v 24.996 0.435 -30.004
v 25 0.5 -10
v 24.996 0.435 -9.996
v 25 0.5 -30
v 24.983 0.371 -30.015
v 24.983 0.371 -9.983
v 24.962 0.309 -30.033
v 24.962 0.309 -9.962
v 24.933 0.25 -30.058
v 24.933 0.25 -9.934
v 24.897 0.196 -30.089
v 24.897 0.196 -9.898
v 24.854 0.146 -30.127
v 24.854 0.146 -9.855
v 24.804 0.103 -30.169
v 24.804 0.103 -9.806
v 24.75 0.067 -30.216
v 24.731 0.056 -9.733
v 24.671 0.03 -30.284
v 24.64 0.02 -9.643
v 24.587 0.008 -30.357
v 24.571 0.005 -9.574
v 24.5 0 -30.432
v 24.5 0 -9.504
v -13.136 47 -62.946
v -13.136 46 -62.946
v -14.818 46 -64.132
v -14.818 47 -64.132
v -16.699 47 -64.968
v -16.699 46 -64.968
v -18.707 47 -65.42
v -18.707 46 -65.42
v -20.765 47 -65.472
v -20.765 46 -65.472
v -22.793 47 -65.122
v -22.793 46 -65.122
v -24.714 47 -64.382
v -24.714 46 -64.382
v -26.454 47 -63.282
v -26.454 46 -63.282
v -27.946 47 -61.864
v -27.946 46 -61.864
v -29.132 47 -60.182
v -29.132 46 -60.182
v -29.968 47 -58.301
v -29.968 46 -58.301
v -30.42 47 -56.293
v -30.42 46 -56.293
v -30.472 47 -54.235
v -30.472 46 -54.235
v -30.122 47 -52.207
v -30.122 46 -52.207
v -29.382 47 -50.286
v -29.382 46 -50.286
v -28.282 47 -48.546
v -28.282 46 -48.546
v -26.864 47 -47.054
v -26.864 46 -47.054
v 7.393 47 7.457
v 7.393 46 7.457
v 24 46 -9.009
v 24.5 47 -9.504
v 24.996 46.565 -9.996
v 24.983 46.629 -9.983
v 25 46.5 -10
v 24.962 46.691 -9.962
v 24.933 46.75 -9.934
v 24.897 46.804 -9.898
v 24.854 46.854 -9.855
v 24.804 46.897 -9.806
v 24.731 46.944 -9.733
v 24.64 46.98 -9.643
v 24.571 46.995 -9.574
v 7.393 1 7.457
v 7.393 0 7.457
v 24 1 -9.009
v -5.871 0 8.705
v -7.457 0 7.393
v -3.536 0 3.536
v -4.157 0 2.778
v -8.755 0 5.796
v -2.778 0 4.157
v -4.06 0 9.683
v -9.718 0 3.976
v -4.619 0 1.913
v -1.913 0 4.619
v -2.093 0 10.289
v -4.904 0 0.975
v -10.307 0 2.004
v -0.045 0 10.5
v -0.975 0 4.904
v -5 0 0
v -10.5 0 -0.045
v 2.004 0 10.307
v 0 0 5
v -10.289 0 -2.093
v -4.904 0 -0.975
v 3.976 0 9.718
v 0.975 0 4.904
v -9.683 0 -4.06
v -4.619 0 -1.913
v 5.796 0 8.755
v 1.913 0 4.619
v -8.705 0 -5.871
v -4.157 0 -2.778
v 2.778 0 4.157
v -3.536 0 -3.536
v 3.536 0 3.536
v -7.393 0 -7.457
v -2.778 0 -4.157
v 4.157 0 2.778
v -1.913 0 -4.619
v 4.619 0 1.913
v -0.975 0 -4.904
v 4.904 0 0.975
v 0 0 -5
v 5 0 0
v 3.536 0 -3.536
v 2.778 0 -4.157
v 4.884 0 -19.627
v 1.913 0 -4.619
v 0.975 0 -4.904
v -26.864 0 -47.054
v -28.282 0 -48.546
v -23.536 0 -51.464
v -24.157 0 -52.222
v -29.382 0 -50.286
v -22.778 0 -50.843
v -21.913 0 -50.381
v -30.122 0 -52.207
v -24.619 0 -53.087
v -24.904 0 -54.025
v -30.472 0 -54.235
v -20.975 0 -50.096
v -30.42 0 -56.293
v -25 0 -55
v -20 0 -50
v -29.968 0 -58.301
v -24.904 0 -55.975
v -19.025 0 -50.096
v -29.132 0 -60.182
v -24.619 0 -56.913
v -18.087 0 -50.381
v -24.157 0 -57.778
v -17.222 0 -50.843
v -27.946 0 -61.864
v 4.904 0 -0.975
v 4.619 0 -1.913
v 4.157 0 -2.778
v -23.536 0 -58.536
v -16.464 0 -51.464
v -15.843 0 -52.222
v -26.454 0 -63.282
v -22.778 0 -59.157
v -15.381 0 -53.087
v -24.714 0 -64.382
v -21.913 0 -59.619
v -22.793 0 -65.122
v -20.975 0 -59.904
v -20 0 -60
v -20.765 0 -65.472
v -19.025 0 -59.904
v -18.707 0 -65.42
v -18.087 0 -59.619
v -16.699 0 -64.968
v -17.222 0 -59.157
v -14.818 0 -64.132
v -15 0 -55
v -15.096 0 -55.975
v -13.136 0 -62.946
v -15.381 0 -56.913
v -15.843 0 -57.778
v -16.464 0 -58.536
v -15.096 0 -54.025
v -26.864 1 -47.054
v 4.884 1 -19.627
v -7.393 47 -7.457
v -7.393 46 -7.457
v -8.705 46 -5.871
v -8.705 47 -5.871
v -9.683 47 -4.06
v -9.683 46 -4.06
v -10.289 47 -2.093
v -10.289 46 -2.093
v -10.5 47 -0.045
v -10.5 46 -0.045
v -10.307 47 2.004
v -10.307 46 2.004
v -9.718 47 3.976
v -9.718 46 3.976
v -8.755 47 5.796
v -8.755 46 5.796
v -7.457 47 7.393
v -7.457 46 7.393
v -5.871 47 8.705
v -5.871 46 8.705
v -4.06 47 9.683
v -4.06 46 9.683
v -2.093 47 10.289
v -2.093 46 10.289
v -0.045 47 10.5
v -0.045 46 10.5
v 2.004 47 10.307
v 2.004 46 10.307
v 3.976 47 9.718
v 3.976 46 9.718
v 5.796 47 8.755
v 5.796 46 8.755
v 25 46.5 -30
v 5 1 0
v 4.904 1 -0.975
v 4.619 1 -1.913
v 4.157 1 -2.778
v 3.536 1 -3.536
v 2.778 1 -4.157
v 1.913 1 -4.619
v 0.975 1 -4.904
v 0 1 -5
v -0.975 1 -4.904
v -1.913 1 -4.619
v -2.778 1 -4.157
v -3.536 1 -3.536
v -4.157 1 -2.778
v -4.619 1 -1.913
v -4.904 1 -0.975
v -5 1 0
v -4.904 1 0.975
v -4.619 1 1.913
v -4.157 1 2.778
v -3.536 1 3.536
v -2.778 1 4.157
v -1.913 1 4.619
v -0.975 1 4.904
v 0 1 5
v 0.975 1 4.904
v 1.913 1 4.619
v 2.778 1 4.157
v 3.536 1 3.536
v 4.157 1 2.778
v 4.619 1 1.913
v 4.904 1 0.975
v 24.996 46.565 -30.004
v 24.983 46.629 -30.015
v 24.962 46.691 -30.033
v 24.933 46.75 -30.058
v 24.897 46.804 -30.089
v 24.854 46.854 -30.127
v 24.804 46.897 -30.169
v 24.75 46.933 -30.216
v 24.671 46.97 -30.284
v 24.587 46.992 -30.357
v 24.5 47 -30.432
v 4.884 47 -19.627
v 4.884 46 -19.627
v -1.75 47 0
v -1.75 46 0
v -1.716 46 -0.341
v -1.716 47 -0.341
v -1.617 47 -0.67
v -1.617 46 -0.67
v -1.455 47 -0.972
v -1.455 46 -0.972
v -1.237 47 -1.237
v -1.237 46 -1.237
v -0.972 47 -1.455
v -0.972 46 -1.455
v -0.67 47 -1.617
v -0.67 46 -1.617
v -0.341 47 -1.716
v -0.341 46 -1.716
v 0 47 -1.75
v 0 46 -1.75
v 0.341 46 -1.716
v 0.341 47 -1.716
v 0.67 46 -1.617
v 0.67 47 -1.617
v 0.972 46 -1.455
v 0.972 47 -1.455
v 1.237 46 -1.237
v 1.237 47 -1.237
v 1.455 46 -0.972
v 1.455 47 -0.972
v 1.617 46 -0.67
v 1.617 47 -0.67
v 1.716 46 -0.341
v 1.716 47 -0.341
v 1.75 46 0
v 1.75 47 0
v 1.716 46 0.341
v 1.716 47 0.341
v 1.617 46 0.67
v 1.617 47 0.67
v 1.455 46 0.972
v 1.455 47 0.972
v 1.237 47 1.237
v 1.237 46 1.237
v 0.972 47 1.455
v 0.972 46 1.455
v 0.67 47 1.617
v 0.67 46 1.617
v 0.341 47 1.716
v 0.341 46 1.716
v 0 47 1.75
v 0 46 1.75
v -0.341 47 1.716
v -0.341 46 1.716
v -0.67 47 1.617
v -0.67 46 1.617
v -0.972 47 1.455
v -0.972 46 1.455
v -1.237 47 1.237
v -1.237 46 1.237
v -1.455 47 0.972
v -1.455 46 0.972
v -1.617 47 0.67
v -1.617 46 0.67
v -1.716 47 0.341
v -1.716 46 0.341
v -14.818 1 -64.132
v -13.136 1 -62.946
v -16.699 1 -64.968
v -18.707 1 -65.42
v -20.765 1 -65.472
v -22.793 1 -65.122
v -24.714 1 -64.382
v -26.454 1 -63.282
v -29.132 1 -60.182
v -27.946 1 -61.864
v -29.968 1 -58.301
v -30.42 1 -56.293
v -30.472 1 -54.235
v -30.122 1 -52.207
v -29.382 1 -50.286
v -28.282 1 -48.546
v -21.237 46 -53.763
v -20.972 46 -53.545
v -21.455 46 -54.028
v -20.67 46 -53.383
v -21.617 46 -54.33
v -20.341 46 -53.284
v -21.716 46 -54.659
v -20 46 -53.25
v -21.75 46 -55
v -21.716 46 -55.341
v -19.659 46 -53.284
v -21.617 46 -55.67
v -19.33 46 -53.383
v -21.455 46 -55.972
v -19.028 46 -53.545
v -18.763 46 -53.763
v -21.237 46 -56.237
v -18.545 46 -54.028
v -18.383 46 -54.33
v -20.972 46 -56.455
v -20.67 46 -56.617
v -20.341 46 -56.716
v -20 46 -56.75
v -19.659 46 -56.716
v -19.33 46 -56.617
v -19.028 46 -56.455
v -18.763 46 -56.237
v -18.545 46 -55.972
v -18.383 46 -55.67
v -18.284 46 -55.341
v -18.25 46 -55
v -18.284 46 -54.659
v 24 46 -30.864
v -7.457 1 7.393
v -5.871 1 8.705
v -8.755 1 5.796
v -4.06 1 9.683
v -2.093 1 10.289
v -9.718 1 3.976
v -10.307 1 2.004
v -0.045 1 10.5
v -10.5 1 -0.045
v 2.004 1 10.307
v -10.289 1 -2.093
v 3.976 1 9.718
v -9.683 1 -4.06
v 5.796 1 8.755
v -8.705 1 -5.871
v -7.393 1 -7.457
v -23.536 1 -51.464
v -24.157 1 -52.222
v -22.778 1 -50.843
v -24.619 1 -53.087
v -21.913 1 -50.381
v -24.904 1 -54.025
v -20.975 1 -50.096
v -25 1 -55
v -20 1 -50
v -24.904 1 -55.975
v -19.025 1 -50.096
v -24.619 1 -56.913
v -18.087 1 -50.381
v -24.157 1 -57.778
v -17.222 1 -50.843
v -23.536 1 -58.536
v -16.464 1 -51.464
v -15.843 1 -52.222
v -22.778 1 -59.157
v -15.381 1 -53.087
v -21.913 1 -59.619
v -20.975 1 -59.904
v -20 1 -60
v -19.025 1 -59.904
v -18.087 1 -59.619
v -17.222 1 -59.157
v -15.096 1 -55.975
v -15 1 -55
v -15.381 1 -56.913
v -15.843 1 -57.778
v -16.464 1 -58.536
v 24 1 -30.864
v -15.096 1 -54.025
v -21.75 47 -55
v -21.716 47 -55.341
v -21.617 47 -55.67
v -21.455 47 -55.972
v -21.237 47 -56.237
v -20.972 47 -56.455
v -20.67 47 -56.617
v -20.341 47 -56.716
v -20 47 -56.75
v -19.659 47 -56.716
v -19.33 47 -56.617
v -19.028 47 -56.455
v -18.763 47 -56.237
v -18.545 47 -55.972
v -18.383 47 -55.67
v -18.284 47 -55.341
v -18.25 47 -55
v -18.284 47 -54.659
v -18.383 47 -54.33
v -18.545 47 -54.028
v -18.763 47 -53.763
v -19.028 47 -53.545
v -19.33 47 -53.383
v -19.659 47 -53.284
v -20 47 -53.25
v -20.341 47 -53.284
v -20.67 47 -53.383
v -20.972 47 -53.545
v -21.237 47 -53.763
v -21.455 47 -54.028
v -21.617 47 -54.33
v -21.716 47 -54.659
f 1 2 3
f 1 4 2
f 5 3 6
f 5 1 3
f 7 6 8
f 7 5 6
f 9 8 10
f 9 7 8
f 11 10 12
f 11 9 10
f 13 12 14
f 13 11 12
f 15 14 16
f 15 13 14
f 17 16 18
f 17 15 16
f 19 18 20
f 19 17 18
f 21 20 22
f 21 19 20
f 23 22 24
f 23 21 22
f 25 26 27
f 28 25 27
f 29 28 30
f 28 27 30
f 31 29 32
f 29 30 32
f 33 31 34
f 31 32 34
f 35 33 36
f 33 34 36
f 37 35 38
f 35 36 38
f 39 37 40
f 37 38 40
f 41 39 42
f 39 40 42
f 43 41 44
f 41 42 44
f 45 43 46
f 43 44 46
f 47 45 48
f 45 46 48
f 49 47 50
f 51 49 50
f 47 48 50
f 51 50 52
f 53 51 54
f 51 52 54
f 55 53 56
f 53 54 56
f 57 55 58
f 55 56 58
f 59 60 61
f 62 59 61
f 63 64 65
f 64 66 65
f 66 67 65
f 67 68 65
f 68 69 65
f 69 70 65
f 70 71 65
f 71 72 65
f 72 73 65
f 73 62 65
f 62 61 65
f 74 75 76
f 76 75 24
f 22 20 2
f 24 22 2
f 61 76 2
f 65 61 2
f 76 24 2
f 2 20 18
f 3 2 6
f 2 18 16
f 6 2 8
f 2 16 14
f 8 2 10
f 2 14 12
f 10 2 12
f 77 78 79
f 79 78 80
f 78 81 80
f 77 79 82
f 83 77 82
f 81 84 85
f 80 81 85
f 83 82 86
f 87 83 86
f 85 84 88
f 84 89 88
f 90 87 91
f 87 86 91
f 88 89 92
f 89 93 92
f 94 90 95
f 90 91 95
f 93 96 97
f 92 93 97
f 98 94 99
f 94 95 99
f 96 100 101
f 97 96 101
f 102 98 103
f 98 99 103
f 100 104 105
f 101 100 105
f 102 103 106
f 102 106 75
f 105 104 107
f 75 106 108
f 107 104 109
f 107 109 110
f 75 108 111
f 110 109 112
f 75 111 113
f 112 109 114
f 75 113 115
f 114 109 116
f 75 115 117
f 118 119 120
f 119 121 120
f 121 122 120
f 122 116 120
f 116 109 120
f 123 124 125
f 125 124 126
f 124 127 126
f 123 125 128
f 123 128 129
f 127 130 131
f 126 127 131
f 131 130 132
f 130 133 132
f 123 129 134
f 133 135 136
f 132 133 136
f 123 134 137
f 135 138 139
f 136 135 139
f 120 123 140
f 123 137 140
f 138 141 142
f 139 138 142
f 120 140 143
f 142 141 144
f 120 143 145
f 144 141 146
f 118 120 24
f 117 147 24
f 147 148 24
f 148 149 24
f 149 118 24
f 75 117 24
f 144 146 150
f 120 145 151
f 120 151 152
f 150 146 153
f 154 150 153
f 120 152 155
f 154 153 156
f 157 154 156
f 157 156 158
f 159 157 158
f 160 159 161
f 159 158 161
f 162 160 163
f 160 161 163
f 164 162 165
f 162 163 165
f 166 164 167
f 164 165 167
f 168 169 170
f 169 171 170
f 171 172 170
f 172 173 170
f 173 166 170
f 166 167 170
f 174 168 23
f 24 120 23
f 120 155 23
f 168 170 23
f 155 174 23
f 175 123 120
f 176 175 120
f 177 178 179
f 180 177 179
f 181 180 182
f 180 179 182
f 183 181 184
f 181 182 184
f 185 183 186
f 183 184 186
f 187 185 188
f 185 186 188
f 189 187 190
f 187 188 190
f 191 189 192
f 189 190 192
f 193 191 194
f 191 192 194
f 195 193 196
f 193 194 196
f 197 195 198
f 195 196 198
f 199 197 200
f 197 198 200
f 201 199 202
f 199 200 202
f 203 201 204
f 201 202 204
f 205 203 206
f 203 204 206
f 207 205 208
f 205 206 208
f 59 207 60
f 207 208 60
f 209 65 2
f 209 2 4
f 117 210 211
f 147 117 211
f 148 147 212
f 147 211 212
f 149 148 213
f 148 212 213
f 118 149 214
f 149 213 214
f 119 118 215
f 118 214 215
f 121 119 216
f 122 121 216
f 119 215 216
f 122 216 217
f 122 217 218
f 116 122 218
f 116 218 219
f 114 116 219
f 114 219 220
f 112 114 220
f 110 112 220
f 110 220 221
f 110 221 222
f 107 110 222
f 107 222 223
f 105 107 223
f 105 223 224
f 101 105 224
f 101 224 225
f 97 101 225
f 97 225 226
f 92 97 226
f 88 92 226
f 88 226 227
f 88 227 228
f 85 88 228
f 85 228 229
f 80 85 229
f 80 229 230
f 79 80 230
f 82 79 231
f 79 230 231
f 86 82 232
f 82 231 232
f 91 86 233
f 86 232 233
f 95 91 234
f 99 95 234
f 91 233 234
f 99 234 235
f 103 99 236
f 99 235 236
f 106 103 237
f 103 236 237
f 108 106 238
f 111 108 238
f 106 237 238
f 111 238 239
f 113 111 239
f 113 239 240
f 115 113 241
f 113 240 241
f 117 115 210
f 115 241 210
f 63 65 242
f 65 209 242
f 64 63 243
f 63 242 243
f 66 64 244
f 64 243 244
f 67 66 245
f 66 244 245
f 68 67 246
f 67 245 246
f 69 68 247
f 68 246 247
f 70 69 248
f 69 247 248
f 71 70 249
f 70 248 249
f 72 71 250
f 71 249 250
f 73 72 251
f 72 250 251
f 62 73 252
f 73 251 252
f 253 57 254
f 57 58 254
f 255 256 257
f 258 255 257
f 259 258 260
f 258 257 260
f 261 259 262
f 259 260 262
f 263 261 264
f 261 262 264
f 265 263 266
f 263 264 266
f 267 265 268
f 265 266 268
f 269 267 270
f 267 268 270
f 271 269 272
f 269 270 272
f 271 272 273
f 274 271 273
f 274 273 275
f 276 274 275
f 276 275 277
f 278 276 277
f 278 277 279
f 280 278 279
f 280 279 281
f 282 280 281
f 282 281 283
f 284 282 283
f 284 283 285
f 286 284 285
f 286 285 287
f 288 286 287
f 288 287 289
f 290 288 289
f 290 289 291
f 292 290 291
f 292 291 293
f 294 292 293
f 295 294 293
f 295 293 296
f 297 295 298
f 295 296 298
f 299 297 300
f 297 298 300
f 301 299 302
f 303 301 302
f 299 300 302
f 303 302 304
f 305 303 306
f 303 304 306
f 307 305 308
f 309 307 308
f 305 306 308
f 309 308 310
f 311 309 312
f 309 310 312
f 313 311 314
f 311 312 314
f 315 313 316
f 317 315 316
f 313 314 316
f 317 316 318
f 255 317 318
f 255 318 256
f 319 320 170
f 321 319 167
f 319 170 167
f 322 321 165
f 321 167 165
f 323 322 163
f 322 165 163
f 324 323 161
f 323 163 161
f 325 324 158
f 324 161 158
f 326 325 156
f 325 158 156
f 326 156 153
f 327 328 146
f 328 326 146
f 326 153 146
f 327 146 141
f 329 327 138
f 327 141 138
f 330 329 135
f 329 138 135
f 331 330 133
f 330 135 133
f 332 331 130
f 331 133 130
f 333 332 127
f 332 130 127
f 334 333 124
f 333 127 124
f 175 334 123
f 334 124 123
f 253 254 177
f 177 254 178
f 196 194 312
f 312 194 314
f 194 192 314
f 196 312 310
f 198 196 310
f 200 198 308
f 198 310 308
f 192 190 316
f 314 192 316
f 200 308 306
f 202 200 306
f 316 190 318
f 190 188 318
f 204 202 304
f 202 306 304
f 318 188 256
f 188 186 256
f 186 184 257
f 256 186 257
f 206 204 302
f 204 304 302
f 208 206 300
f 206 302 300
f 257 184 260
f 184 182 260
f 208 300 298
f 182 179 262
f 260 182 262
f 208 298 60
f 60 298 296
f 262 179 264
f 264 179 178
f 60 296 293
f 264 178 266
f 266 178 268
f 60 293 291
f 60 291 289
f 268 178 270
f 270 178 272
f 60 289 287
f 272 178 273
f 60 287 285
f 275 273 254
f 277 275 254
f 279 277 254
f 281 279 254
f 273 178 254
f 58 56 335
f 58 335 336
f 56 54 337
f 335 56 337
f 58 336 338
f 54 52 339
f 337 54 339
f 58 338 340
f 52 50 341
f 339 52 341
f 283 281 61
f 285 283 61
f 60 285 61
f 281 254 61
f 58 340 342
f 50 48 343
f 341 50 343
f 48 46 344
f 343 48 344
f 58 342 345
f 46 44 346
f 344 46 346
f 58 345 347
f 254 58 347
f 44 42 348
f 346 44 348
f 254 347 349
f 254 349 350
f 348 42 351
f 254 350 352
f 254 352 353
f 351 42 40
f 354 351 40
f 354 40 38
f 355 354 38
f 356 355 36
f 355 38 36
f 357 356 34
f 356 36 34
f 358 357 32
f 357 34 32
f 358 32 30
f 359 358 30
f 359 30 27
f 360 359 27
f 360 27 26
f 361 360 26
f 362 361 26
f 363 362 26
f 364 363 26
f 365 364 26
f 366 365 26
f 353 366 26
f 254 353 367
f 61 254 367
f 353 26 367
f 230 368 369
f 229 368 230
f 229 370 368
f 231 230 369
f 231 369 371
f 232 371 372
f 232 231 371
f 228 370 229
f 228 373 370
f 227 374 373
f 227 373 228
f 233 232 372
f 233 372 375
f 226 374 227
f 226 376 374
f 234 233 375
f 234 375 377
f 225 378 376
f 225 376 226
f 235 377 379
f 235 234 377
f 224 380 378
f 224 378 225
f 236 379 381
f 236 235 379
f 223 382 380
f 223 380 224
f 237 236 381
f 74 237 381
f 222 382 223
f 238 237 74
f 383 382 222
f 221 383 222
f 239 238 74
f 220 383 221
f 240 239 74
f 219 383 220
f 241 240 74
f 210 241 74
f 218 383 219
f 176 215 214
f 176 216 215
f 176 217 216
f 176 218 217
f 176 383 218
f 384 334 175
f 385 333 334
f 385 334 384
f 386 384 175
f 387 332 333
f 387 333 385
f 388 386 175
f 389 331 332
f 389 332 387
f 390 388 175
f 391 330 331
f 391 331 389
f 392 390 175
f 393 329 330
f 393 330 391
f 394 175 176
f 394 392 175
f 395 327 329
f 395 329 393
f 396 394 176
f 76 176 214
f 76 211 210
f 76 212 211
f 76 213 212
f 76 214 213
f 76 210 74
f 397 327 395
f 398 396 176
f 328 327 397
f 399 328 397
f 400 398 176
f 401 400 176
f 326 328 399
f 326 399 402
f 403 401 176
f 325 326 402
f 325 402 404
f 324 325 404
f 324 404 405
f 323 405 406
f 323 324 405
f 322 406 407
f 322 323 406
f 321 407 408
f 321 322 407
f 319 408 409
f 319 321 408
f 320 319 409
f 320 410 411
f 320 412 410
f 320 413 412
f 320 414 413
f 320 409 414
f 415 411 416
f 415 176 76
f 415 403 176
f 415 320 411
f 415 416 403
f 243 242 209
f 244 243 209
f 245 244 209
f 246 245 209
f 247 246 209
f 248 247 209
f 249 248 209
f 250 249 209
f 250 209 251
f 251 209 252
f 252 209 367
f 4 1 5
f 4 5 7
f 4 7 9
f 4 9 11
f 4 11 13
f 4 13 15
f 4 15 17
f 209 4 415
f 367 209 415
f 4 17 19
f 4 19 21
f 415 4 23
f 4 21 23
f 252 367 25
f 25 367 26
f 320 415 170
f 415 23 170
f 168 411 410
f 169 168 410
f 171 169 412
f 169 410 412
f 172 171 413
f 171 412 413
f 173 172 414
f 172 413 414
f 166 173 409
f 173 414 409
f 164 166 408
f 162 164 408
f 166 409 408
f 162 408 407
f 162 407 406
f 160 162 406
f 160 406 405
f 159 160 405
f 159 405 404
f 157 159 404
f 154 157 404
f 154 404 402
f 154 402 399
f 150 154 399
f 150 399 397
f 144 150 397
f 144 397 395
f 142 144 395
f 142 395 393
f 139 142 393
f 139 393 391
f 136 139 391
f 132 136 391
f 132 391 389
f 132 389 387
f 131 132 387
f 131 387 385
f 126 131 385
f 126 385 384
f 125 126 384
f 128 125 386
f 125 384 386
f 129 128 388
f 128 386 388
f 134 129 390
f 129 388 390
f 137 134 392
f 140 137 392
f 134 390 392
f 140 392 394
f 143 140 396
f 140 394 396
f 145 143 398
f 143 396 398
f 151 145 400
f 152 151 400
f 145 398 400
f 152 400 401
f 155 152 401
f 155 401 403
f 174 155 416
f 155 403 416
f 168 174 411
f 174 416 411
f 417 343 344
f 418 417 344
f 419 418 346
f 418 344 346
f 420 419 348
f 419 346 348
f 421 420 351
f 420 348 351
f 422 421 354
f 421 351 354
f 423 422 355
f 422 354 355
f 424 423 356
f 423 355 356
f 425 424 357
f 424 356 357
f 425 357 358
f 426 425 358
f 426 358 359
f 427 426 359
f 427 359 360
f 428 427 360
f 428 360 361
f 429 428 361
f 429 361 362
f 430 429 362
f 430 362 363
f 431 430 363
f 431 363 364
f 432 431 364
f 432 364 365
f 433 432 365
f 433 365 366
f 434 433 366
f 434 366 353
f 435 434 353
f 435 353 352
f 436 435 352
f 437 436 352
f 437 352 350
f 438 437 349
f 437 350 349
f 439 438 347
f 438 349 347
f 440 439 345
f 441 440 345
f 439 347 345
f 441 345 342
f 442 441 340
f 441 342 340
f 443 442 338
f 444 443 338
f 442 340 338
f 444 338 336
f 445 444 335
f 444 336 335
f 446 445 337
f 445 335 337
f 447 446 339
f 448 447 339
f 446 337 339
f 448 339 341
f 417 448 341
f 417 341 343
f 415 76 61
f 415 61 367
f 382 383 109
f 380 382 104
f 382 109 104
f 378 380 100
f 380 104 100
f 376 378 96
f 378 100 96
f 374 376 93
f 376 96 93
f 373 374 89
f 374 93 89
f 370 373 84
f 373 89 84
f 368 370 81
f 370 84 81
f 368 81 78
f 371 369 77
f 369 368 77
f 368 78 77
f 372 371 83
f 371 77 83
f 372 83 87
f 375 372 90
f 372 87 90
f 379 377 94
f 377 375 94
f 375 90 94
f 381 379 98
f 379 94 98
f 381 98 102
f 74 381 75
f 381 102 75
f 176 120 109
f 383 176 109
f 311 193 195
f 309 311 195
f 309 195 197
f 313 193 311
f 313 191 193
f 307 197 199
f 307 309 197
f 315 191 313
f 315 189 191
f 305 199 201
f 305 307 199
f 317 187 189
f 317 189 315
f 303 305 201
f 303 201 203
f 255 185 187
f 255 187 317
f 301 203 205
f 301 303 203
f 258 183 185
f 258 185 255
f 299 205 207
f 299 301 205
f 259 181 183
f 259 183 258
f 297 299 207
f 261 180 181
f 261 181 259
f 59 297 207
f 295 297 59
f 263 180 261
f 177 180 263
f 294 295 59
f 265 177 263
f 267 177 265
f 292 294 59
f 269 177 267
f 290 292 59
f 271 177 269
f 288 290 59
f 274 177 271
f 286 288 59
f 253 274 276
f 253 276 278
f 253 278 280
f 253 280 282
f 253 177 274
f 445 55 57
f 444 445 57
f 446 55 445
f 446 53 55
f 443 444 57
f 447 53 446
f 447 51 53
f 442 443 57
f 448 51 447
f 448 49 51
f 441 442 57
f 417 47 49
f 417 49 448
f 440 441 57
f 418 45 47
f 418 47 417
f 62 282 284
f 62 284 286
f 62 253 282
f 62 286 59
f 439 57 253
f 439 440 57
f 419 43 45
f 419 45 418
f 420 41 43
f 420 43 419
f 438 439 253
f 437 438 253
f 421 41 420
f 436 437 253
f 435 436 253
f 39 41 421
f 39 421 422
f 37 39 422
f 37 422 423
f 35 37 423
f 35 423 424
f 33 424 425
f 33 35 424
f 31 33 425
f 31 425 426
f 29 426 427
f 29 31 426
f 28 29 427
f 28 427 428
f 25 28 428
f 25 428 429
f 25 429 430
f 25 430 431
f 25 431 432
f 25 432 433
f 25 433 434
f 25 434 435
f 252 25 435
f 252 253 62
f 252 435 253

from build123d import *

# Parameters (mm, degrees)
EXTRUDE_1_DEPTH             = 47
SHELL_1_T                   = -1
FILLET_2_R                  = 0.5
HOLE_WIZARD_3_5_3_5_1_D     = 3.5
HOLE_WIZARD_3_5_3_5_1_DEPTH = 1
HOLE_WIZARD_10_0_10_3_D     = 10
HOLE_WIZARD_10_0_10_3_DEPTH = 1


with BuildPart() as part:
    # 草图1 → 凸台-拉伸1 (new body)
    with BuildSketch(Plane(origin=(0, 0, 0), x_dir=(1, 0, 0), z_dir=(0, 1, 0))):
        with BuildLine():
            Line((25, 30), (-13.135780284, 62.94559549))
            ThreePointArc((-13.135780284, 62.94559549), (-27.94559549, 61.864219716), (-26.864219716, 47.05440451))
            Line((-26.864219716, 47.05440451), (4.883538541, 19.627437146))
            Line((4.883538541, 19.627437146), (-7.392601402, 7.456503505))
            ThreePointArc((-7.392601402, 7.456503505), (-7.456503505, -7.392601402), (7.392601402, -7.456503505))
            Line((7.392601402, -7.456503505), (25, 10))
            Line((25, 10), (25, 30))
        make_face()
    extrude(amount=EXTRUDE_1_DEPTH)

    # 抽壳1
    shell_1_openings = [part.faces().sort_by_distance(p)[0] for p in [
        (5.932109858, 23.5, -46.472797745),
        (16.196300701, 23.5, -1.271748248),
        (-7.456503505, 23.5, 7.392601402),
        (-1.25453143, 23.5, -13.541970325),
        (-10.990340588, 23.5, -33.340920828),
        (-27.94559549, 23.5, -61.864219716),
    ]]
    offset(amount=SHELL_1_T, openings=shell_1_openings, kind=Kind.INTERSECTION)

    # 圆角2
    fillet_2_edges = [part.edges().sort_by_distance(p)[0] for p in [
        (25, 47, -20),
        (25, 0, -20),
    ]]
    fillet(fillet_2_edges, radius=FILLET_2_R)

    # Ø3.5 (3.5) 直径槽口1
    with Locations(Plane(origin=(0, 47, 0), x_dir=(1, 0, 0), z_dir=(0, 1, 0))):
        with Locations((0, 0), (-20, 55)):
            Hole(HOLE_WIZARD_3_5_3_5_1_D / 2, depth=HOLE_WIZARD_3_5_3_5_1_DEPTH)

    # Ø10.0 (10) 直径槽口3
    with Locations(Plane(origin=(0, 0, 0), x_dir=(-1, 0, 0), z_dir=(0, -1, 0))):
        with Locations((0, 0), (20, 55)):
            Hole(HOLE_WIZARD_10_0_10_3_D / 2, depth=HOLE_WIZARD_10_0_10_3_DEPTH)


solid = part.part
